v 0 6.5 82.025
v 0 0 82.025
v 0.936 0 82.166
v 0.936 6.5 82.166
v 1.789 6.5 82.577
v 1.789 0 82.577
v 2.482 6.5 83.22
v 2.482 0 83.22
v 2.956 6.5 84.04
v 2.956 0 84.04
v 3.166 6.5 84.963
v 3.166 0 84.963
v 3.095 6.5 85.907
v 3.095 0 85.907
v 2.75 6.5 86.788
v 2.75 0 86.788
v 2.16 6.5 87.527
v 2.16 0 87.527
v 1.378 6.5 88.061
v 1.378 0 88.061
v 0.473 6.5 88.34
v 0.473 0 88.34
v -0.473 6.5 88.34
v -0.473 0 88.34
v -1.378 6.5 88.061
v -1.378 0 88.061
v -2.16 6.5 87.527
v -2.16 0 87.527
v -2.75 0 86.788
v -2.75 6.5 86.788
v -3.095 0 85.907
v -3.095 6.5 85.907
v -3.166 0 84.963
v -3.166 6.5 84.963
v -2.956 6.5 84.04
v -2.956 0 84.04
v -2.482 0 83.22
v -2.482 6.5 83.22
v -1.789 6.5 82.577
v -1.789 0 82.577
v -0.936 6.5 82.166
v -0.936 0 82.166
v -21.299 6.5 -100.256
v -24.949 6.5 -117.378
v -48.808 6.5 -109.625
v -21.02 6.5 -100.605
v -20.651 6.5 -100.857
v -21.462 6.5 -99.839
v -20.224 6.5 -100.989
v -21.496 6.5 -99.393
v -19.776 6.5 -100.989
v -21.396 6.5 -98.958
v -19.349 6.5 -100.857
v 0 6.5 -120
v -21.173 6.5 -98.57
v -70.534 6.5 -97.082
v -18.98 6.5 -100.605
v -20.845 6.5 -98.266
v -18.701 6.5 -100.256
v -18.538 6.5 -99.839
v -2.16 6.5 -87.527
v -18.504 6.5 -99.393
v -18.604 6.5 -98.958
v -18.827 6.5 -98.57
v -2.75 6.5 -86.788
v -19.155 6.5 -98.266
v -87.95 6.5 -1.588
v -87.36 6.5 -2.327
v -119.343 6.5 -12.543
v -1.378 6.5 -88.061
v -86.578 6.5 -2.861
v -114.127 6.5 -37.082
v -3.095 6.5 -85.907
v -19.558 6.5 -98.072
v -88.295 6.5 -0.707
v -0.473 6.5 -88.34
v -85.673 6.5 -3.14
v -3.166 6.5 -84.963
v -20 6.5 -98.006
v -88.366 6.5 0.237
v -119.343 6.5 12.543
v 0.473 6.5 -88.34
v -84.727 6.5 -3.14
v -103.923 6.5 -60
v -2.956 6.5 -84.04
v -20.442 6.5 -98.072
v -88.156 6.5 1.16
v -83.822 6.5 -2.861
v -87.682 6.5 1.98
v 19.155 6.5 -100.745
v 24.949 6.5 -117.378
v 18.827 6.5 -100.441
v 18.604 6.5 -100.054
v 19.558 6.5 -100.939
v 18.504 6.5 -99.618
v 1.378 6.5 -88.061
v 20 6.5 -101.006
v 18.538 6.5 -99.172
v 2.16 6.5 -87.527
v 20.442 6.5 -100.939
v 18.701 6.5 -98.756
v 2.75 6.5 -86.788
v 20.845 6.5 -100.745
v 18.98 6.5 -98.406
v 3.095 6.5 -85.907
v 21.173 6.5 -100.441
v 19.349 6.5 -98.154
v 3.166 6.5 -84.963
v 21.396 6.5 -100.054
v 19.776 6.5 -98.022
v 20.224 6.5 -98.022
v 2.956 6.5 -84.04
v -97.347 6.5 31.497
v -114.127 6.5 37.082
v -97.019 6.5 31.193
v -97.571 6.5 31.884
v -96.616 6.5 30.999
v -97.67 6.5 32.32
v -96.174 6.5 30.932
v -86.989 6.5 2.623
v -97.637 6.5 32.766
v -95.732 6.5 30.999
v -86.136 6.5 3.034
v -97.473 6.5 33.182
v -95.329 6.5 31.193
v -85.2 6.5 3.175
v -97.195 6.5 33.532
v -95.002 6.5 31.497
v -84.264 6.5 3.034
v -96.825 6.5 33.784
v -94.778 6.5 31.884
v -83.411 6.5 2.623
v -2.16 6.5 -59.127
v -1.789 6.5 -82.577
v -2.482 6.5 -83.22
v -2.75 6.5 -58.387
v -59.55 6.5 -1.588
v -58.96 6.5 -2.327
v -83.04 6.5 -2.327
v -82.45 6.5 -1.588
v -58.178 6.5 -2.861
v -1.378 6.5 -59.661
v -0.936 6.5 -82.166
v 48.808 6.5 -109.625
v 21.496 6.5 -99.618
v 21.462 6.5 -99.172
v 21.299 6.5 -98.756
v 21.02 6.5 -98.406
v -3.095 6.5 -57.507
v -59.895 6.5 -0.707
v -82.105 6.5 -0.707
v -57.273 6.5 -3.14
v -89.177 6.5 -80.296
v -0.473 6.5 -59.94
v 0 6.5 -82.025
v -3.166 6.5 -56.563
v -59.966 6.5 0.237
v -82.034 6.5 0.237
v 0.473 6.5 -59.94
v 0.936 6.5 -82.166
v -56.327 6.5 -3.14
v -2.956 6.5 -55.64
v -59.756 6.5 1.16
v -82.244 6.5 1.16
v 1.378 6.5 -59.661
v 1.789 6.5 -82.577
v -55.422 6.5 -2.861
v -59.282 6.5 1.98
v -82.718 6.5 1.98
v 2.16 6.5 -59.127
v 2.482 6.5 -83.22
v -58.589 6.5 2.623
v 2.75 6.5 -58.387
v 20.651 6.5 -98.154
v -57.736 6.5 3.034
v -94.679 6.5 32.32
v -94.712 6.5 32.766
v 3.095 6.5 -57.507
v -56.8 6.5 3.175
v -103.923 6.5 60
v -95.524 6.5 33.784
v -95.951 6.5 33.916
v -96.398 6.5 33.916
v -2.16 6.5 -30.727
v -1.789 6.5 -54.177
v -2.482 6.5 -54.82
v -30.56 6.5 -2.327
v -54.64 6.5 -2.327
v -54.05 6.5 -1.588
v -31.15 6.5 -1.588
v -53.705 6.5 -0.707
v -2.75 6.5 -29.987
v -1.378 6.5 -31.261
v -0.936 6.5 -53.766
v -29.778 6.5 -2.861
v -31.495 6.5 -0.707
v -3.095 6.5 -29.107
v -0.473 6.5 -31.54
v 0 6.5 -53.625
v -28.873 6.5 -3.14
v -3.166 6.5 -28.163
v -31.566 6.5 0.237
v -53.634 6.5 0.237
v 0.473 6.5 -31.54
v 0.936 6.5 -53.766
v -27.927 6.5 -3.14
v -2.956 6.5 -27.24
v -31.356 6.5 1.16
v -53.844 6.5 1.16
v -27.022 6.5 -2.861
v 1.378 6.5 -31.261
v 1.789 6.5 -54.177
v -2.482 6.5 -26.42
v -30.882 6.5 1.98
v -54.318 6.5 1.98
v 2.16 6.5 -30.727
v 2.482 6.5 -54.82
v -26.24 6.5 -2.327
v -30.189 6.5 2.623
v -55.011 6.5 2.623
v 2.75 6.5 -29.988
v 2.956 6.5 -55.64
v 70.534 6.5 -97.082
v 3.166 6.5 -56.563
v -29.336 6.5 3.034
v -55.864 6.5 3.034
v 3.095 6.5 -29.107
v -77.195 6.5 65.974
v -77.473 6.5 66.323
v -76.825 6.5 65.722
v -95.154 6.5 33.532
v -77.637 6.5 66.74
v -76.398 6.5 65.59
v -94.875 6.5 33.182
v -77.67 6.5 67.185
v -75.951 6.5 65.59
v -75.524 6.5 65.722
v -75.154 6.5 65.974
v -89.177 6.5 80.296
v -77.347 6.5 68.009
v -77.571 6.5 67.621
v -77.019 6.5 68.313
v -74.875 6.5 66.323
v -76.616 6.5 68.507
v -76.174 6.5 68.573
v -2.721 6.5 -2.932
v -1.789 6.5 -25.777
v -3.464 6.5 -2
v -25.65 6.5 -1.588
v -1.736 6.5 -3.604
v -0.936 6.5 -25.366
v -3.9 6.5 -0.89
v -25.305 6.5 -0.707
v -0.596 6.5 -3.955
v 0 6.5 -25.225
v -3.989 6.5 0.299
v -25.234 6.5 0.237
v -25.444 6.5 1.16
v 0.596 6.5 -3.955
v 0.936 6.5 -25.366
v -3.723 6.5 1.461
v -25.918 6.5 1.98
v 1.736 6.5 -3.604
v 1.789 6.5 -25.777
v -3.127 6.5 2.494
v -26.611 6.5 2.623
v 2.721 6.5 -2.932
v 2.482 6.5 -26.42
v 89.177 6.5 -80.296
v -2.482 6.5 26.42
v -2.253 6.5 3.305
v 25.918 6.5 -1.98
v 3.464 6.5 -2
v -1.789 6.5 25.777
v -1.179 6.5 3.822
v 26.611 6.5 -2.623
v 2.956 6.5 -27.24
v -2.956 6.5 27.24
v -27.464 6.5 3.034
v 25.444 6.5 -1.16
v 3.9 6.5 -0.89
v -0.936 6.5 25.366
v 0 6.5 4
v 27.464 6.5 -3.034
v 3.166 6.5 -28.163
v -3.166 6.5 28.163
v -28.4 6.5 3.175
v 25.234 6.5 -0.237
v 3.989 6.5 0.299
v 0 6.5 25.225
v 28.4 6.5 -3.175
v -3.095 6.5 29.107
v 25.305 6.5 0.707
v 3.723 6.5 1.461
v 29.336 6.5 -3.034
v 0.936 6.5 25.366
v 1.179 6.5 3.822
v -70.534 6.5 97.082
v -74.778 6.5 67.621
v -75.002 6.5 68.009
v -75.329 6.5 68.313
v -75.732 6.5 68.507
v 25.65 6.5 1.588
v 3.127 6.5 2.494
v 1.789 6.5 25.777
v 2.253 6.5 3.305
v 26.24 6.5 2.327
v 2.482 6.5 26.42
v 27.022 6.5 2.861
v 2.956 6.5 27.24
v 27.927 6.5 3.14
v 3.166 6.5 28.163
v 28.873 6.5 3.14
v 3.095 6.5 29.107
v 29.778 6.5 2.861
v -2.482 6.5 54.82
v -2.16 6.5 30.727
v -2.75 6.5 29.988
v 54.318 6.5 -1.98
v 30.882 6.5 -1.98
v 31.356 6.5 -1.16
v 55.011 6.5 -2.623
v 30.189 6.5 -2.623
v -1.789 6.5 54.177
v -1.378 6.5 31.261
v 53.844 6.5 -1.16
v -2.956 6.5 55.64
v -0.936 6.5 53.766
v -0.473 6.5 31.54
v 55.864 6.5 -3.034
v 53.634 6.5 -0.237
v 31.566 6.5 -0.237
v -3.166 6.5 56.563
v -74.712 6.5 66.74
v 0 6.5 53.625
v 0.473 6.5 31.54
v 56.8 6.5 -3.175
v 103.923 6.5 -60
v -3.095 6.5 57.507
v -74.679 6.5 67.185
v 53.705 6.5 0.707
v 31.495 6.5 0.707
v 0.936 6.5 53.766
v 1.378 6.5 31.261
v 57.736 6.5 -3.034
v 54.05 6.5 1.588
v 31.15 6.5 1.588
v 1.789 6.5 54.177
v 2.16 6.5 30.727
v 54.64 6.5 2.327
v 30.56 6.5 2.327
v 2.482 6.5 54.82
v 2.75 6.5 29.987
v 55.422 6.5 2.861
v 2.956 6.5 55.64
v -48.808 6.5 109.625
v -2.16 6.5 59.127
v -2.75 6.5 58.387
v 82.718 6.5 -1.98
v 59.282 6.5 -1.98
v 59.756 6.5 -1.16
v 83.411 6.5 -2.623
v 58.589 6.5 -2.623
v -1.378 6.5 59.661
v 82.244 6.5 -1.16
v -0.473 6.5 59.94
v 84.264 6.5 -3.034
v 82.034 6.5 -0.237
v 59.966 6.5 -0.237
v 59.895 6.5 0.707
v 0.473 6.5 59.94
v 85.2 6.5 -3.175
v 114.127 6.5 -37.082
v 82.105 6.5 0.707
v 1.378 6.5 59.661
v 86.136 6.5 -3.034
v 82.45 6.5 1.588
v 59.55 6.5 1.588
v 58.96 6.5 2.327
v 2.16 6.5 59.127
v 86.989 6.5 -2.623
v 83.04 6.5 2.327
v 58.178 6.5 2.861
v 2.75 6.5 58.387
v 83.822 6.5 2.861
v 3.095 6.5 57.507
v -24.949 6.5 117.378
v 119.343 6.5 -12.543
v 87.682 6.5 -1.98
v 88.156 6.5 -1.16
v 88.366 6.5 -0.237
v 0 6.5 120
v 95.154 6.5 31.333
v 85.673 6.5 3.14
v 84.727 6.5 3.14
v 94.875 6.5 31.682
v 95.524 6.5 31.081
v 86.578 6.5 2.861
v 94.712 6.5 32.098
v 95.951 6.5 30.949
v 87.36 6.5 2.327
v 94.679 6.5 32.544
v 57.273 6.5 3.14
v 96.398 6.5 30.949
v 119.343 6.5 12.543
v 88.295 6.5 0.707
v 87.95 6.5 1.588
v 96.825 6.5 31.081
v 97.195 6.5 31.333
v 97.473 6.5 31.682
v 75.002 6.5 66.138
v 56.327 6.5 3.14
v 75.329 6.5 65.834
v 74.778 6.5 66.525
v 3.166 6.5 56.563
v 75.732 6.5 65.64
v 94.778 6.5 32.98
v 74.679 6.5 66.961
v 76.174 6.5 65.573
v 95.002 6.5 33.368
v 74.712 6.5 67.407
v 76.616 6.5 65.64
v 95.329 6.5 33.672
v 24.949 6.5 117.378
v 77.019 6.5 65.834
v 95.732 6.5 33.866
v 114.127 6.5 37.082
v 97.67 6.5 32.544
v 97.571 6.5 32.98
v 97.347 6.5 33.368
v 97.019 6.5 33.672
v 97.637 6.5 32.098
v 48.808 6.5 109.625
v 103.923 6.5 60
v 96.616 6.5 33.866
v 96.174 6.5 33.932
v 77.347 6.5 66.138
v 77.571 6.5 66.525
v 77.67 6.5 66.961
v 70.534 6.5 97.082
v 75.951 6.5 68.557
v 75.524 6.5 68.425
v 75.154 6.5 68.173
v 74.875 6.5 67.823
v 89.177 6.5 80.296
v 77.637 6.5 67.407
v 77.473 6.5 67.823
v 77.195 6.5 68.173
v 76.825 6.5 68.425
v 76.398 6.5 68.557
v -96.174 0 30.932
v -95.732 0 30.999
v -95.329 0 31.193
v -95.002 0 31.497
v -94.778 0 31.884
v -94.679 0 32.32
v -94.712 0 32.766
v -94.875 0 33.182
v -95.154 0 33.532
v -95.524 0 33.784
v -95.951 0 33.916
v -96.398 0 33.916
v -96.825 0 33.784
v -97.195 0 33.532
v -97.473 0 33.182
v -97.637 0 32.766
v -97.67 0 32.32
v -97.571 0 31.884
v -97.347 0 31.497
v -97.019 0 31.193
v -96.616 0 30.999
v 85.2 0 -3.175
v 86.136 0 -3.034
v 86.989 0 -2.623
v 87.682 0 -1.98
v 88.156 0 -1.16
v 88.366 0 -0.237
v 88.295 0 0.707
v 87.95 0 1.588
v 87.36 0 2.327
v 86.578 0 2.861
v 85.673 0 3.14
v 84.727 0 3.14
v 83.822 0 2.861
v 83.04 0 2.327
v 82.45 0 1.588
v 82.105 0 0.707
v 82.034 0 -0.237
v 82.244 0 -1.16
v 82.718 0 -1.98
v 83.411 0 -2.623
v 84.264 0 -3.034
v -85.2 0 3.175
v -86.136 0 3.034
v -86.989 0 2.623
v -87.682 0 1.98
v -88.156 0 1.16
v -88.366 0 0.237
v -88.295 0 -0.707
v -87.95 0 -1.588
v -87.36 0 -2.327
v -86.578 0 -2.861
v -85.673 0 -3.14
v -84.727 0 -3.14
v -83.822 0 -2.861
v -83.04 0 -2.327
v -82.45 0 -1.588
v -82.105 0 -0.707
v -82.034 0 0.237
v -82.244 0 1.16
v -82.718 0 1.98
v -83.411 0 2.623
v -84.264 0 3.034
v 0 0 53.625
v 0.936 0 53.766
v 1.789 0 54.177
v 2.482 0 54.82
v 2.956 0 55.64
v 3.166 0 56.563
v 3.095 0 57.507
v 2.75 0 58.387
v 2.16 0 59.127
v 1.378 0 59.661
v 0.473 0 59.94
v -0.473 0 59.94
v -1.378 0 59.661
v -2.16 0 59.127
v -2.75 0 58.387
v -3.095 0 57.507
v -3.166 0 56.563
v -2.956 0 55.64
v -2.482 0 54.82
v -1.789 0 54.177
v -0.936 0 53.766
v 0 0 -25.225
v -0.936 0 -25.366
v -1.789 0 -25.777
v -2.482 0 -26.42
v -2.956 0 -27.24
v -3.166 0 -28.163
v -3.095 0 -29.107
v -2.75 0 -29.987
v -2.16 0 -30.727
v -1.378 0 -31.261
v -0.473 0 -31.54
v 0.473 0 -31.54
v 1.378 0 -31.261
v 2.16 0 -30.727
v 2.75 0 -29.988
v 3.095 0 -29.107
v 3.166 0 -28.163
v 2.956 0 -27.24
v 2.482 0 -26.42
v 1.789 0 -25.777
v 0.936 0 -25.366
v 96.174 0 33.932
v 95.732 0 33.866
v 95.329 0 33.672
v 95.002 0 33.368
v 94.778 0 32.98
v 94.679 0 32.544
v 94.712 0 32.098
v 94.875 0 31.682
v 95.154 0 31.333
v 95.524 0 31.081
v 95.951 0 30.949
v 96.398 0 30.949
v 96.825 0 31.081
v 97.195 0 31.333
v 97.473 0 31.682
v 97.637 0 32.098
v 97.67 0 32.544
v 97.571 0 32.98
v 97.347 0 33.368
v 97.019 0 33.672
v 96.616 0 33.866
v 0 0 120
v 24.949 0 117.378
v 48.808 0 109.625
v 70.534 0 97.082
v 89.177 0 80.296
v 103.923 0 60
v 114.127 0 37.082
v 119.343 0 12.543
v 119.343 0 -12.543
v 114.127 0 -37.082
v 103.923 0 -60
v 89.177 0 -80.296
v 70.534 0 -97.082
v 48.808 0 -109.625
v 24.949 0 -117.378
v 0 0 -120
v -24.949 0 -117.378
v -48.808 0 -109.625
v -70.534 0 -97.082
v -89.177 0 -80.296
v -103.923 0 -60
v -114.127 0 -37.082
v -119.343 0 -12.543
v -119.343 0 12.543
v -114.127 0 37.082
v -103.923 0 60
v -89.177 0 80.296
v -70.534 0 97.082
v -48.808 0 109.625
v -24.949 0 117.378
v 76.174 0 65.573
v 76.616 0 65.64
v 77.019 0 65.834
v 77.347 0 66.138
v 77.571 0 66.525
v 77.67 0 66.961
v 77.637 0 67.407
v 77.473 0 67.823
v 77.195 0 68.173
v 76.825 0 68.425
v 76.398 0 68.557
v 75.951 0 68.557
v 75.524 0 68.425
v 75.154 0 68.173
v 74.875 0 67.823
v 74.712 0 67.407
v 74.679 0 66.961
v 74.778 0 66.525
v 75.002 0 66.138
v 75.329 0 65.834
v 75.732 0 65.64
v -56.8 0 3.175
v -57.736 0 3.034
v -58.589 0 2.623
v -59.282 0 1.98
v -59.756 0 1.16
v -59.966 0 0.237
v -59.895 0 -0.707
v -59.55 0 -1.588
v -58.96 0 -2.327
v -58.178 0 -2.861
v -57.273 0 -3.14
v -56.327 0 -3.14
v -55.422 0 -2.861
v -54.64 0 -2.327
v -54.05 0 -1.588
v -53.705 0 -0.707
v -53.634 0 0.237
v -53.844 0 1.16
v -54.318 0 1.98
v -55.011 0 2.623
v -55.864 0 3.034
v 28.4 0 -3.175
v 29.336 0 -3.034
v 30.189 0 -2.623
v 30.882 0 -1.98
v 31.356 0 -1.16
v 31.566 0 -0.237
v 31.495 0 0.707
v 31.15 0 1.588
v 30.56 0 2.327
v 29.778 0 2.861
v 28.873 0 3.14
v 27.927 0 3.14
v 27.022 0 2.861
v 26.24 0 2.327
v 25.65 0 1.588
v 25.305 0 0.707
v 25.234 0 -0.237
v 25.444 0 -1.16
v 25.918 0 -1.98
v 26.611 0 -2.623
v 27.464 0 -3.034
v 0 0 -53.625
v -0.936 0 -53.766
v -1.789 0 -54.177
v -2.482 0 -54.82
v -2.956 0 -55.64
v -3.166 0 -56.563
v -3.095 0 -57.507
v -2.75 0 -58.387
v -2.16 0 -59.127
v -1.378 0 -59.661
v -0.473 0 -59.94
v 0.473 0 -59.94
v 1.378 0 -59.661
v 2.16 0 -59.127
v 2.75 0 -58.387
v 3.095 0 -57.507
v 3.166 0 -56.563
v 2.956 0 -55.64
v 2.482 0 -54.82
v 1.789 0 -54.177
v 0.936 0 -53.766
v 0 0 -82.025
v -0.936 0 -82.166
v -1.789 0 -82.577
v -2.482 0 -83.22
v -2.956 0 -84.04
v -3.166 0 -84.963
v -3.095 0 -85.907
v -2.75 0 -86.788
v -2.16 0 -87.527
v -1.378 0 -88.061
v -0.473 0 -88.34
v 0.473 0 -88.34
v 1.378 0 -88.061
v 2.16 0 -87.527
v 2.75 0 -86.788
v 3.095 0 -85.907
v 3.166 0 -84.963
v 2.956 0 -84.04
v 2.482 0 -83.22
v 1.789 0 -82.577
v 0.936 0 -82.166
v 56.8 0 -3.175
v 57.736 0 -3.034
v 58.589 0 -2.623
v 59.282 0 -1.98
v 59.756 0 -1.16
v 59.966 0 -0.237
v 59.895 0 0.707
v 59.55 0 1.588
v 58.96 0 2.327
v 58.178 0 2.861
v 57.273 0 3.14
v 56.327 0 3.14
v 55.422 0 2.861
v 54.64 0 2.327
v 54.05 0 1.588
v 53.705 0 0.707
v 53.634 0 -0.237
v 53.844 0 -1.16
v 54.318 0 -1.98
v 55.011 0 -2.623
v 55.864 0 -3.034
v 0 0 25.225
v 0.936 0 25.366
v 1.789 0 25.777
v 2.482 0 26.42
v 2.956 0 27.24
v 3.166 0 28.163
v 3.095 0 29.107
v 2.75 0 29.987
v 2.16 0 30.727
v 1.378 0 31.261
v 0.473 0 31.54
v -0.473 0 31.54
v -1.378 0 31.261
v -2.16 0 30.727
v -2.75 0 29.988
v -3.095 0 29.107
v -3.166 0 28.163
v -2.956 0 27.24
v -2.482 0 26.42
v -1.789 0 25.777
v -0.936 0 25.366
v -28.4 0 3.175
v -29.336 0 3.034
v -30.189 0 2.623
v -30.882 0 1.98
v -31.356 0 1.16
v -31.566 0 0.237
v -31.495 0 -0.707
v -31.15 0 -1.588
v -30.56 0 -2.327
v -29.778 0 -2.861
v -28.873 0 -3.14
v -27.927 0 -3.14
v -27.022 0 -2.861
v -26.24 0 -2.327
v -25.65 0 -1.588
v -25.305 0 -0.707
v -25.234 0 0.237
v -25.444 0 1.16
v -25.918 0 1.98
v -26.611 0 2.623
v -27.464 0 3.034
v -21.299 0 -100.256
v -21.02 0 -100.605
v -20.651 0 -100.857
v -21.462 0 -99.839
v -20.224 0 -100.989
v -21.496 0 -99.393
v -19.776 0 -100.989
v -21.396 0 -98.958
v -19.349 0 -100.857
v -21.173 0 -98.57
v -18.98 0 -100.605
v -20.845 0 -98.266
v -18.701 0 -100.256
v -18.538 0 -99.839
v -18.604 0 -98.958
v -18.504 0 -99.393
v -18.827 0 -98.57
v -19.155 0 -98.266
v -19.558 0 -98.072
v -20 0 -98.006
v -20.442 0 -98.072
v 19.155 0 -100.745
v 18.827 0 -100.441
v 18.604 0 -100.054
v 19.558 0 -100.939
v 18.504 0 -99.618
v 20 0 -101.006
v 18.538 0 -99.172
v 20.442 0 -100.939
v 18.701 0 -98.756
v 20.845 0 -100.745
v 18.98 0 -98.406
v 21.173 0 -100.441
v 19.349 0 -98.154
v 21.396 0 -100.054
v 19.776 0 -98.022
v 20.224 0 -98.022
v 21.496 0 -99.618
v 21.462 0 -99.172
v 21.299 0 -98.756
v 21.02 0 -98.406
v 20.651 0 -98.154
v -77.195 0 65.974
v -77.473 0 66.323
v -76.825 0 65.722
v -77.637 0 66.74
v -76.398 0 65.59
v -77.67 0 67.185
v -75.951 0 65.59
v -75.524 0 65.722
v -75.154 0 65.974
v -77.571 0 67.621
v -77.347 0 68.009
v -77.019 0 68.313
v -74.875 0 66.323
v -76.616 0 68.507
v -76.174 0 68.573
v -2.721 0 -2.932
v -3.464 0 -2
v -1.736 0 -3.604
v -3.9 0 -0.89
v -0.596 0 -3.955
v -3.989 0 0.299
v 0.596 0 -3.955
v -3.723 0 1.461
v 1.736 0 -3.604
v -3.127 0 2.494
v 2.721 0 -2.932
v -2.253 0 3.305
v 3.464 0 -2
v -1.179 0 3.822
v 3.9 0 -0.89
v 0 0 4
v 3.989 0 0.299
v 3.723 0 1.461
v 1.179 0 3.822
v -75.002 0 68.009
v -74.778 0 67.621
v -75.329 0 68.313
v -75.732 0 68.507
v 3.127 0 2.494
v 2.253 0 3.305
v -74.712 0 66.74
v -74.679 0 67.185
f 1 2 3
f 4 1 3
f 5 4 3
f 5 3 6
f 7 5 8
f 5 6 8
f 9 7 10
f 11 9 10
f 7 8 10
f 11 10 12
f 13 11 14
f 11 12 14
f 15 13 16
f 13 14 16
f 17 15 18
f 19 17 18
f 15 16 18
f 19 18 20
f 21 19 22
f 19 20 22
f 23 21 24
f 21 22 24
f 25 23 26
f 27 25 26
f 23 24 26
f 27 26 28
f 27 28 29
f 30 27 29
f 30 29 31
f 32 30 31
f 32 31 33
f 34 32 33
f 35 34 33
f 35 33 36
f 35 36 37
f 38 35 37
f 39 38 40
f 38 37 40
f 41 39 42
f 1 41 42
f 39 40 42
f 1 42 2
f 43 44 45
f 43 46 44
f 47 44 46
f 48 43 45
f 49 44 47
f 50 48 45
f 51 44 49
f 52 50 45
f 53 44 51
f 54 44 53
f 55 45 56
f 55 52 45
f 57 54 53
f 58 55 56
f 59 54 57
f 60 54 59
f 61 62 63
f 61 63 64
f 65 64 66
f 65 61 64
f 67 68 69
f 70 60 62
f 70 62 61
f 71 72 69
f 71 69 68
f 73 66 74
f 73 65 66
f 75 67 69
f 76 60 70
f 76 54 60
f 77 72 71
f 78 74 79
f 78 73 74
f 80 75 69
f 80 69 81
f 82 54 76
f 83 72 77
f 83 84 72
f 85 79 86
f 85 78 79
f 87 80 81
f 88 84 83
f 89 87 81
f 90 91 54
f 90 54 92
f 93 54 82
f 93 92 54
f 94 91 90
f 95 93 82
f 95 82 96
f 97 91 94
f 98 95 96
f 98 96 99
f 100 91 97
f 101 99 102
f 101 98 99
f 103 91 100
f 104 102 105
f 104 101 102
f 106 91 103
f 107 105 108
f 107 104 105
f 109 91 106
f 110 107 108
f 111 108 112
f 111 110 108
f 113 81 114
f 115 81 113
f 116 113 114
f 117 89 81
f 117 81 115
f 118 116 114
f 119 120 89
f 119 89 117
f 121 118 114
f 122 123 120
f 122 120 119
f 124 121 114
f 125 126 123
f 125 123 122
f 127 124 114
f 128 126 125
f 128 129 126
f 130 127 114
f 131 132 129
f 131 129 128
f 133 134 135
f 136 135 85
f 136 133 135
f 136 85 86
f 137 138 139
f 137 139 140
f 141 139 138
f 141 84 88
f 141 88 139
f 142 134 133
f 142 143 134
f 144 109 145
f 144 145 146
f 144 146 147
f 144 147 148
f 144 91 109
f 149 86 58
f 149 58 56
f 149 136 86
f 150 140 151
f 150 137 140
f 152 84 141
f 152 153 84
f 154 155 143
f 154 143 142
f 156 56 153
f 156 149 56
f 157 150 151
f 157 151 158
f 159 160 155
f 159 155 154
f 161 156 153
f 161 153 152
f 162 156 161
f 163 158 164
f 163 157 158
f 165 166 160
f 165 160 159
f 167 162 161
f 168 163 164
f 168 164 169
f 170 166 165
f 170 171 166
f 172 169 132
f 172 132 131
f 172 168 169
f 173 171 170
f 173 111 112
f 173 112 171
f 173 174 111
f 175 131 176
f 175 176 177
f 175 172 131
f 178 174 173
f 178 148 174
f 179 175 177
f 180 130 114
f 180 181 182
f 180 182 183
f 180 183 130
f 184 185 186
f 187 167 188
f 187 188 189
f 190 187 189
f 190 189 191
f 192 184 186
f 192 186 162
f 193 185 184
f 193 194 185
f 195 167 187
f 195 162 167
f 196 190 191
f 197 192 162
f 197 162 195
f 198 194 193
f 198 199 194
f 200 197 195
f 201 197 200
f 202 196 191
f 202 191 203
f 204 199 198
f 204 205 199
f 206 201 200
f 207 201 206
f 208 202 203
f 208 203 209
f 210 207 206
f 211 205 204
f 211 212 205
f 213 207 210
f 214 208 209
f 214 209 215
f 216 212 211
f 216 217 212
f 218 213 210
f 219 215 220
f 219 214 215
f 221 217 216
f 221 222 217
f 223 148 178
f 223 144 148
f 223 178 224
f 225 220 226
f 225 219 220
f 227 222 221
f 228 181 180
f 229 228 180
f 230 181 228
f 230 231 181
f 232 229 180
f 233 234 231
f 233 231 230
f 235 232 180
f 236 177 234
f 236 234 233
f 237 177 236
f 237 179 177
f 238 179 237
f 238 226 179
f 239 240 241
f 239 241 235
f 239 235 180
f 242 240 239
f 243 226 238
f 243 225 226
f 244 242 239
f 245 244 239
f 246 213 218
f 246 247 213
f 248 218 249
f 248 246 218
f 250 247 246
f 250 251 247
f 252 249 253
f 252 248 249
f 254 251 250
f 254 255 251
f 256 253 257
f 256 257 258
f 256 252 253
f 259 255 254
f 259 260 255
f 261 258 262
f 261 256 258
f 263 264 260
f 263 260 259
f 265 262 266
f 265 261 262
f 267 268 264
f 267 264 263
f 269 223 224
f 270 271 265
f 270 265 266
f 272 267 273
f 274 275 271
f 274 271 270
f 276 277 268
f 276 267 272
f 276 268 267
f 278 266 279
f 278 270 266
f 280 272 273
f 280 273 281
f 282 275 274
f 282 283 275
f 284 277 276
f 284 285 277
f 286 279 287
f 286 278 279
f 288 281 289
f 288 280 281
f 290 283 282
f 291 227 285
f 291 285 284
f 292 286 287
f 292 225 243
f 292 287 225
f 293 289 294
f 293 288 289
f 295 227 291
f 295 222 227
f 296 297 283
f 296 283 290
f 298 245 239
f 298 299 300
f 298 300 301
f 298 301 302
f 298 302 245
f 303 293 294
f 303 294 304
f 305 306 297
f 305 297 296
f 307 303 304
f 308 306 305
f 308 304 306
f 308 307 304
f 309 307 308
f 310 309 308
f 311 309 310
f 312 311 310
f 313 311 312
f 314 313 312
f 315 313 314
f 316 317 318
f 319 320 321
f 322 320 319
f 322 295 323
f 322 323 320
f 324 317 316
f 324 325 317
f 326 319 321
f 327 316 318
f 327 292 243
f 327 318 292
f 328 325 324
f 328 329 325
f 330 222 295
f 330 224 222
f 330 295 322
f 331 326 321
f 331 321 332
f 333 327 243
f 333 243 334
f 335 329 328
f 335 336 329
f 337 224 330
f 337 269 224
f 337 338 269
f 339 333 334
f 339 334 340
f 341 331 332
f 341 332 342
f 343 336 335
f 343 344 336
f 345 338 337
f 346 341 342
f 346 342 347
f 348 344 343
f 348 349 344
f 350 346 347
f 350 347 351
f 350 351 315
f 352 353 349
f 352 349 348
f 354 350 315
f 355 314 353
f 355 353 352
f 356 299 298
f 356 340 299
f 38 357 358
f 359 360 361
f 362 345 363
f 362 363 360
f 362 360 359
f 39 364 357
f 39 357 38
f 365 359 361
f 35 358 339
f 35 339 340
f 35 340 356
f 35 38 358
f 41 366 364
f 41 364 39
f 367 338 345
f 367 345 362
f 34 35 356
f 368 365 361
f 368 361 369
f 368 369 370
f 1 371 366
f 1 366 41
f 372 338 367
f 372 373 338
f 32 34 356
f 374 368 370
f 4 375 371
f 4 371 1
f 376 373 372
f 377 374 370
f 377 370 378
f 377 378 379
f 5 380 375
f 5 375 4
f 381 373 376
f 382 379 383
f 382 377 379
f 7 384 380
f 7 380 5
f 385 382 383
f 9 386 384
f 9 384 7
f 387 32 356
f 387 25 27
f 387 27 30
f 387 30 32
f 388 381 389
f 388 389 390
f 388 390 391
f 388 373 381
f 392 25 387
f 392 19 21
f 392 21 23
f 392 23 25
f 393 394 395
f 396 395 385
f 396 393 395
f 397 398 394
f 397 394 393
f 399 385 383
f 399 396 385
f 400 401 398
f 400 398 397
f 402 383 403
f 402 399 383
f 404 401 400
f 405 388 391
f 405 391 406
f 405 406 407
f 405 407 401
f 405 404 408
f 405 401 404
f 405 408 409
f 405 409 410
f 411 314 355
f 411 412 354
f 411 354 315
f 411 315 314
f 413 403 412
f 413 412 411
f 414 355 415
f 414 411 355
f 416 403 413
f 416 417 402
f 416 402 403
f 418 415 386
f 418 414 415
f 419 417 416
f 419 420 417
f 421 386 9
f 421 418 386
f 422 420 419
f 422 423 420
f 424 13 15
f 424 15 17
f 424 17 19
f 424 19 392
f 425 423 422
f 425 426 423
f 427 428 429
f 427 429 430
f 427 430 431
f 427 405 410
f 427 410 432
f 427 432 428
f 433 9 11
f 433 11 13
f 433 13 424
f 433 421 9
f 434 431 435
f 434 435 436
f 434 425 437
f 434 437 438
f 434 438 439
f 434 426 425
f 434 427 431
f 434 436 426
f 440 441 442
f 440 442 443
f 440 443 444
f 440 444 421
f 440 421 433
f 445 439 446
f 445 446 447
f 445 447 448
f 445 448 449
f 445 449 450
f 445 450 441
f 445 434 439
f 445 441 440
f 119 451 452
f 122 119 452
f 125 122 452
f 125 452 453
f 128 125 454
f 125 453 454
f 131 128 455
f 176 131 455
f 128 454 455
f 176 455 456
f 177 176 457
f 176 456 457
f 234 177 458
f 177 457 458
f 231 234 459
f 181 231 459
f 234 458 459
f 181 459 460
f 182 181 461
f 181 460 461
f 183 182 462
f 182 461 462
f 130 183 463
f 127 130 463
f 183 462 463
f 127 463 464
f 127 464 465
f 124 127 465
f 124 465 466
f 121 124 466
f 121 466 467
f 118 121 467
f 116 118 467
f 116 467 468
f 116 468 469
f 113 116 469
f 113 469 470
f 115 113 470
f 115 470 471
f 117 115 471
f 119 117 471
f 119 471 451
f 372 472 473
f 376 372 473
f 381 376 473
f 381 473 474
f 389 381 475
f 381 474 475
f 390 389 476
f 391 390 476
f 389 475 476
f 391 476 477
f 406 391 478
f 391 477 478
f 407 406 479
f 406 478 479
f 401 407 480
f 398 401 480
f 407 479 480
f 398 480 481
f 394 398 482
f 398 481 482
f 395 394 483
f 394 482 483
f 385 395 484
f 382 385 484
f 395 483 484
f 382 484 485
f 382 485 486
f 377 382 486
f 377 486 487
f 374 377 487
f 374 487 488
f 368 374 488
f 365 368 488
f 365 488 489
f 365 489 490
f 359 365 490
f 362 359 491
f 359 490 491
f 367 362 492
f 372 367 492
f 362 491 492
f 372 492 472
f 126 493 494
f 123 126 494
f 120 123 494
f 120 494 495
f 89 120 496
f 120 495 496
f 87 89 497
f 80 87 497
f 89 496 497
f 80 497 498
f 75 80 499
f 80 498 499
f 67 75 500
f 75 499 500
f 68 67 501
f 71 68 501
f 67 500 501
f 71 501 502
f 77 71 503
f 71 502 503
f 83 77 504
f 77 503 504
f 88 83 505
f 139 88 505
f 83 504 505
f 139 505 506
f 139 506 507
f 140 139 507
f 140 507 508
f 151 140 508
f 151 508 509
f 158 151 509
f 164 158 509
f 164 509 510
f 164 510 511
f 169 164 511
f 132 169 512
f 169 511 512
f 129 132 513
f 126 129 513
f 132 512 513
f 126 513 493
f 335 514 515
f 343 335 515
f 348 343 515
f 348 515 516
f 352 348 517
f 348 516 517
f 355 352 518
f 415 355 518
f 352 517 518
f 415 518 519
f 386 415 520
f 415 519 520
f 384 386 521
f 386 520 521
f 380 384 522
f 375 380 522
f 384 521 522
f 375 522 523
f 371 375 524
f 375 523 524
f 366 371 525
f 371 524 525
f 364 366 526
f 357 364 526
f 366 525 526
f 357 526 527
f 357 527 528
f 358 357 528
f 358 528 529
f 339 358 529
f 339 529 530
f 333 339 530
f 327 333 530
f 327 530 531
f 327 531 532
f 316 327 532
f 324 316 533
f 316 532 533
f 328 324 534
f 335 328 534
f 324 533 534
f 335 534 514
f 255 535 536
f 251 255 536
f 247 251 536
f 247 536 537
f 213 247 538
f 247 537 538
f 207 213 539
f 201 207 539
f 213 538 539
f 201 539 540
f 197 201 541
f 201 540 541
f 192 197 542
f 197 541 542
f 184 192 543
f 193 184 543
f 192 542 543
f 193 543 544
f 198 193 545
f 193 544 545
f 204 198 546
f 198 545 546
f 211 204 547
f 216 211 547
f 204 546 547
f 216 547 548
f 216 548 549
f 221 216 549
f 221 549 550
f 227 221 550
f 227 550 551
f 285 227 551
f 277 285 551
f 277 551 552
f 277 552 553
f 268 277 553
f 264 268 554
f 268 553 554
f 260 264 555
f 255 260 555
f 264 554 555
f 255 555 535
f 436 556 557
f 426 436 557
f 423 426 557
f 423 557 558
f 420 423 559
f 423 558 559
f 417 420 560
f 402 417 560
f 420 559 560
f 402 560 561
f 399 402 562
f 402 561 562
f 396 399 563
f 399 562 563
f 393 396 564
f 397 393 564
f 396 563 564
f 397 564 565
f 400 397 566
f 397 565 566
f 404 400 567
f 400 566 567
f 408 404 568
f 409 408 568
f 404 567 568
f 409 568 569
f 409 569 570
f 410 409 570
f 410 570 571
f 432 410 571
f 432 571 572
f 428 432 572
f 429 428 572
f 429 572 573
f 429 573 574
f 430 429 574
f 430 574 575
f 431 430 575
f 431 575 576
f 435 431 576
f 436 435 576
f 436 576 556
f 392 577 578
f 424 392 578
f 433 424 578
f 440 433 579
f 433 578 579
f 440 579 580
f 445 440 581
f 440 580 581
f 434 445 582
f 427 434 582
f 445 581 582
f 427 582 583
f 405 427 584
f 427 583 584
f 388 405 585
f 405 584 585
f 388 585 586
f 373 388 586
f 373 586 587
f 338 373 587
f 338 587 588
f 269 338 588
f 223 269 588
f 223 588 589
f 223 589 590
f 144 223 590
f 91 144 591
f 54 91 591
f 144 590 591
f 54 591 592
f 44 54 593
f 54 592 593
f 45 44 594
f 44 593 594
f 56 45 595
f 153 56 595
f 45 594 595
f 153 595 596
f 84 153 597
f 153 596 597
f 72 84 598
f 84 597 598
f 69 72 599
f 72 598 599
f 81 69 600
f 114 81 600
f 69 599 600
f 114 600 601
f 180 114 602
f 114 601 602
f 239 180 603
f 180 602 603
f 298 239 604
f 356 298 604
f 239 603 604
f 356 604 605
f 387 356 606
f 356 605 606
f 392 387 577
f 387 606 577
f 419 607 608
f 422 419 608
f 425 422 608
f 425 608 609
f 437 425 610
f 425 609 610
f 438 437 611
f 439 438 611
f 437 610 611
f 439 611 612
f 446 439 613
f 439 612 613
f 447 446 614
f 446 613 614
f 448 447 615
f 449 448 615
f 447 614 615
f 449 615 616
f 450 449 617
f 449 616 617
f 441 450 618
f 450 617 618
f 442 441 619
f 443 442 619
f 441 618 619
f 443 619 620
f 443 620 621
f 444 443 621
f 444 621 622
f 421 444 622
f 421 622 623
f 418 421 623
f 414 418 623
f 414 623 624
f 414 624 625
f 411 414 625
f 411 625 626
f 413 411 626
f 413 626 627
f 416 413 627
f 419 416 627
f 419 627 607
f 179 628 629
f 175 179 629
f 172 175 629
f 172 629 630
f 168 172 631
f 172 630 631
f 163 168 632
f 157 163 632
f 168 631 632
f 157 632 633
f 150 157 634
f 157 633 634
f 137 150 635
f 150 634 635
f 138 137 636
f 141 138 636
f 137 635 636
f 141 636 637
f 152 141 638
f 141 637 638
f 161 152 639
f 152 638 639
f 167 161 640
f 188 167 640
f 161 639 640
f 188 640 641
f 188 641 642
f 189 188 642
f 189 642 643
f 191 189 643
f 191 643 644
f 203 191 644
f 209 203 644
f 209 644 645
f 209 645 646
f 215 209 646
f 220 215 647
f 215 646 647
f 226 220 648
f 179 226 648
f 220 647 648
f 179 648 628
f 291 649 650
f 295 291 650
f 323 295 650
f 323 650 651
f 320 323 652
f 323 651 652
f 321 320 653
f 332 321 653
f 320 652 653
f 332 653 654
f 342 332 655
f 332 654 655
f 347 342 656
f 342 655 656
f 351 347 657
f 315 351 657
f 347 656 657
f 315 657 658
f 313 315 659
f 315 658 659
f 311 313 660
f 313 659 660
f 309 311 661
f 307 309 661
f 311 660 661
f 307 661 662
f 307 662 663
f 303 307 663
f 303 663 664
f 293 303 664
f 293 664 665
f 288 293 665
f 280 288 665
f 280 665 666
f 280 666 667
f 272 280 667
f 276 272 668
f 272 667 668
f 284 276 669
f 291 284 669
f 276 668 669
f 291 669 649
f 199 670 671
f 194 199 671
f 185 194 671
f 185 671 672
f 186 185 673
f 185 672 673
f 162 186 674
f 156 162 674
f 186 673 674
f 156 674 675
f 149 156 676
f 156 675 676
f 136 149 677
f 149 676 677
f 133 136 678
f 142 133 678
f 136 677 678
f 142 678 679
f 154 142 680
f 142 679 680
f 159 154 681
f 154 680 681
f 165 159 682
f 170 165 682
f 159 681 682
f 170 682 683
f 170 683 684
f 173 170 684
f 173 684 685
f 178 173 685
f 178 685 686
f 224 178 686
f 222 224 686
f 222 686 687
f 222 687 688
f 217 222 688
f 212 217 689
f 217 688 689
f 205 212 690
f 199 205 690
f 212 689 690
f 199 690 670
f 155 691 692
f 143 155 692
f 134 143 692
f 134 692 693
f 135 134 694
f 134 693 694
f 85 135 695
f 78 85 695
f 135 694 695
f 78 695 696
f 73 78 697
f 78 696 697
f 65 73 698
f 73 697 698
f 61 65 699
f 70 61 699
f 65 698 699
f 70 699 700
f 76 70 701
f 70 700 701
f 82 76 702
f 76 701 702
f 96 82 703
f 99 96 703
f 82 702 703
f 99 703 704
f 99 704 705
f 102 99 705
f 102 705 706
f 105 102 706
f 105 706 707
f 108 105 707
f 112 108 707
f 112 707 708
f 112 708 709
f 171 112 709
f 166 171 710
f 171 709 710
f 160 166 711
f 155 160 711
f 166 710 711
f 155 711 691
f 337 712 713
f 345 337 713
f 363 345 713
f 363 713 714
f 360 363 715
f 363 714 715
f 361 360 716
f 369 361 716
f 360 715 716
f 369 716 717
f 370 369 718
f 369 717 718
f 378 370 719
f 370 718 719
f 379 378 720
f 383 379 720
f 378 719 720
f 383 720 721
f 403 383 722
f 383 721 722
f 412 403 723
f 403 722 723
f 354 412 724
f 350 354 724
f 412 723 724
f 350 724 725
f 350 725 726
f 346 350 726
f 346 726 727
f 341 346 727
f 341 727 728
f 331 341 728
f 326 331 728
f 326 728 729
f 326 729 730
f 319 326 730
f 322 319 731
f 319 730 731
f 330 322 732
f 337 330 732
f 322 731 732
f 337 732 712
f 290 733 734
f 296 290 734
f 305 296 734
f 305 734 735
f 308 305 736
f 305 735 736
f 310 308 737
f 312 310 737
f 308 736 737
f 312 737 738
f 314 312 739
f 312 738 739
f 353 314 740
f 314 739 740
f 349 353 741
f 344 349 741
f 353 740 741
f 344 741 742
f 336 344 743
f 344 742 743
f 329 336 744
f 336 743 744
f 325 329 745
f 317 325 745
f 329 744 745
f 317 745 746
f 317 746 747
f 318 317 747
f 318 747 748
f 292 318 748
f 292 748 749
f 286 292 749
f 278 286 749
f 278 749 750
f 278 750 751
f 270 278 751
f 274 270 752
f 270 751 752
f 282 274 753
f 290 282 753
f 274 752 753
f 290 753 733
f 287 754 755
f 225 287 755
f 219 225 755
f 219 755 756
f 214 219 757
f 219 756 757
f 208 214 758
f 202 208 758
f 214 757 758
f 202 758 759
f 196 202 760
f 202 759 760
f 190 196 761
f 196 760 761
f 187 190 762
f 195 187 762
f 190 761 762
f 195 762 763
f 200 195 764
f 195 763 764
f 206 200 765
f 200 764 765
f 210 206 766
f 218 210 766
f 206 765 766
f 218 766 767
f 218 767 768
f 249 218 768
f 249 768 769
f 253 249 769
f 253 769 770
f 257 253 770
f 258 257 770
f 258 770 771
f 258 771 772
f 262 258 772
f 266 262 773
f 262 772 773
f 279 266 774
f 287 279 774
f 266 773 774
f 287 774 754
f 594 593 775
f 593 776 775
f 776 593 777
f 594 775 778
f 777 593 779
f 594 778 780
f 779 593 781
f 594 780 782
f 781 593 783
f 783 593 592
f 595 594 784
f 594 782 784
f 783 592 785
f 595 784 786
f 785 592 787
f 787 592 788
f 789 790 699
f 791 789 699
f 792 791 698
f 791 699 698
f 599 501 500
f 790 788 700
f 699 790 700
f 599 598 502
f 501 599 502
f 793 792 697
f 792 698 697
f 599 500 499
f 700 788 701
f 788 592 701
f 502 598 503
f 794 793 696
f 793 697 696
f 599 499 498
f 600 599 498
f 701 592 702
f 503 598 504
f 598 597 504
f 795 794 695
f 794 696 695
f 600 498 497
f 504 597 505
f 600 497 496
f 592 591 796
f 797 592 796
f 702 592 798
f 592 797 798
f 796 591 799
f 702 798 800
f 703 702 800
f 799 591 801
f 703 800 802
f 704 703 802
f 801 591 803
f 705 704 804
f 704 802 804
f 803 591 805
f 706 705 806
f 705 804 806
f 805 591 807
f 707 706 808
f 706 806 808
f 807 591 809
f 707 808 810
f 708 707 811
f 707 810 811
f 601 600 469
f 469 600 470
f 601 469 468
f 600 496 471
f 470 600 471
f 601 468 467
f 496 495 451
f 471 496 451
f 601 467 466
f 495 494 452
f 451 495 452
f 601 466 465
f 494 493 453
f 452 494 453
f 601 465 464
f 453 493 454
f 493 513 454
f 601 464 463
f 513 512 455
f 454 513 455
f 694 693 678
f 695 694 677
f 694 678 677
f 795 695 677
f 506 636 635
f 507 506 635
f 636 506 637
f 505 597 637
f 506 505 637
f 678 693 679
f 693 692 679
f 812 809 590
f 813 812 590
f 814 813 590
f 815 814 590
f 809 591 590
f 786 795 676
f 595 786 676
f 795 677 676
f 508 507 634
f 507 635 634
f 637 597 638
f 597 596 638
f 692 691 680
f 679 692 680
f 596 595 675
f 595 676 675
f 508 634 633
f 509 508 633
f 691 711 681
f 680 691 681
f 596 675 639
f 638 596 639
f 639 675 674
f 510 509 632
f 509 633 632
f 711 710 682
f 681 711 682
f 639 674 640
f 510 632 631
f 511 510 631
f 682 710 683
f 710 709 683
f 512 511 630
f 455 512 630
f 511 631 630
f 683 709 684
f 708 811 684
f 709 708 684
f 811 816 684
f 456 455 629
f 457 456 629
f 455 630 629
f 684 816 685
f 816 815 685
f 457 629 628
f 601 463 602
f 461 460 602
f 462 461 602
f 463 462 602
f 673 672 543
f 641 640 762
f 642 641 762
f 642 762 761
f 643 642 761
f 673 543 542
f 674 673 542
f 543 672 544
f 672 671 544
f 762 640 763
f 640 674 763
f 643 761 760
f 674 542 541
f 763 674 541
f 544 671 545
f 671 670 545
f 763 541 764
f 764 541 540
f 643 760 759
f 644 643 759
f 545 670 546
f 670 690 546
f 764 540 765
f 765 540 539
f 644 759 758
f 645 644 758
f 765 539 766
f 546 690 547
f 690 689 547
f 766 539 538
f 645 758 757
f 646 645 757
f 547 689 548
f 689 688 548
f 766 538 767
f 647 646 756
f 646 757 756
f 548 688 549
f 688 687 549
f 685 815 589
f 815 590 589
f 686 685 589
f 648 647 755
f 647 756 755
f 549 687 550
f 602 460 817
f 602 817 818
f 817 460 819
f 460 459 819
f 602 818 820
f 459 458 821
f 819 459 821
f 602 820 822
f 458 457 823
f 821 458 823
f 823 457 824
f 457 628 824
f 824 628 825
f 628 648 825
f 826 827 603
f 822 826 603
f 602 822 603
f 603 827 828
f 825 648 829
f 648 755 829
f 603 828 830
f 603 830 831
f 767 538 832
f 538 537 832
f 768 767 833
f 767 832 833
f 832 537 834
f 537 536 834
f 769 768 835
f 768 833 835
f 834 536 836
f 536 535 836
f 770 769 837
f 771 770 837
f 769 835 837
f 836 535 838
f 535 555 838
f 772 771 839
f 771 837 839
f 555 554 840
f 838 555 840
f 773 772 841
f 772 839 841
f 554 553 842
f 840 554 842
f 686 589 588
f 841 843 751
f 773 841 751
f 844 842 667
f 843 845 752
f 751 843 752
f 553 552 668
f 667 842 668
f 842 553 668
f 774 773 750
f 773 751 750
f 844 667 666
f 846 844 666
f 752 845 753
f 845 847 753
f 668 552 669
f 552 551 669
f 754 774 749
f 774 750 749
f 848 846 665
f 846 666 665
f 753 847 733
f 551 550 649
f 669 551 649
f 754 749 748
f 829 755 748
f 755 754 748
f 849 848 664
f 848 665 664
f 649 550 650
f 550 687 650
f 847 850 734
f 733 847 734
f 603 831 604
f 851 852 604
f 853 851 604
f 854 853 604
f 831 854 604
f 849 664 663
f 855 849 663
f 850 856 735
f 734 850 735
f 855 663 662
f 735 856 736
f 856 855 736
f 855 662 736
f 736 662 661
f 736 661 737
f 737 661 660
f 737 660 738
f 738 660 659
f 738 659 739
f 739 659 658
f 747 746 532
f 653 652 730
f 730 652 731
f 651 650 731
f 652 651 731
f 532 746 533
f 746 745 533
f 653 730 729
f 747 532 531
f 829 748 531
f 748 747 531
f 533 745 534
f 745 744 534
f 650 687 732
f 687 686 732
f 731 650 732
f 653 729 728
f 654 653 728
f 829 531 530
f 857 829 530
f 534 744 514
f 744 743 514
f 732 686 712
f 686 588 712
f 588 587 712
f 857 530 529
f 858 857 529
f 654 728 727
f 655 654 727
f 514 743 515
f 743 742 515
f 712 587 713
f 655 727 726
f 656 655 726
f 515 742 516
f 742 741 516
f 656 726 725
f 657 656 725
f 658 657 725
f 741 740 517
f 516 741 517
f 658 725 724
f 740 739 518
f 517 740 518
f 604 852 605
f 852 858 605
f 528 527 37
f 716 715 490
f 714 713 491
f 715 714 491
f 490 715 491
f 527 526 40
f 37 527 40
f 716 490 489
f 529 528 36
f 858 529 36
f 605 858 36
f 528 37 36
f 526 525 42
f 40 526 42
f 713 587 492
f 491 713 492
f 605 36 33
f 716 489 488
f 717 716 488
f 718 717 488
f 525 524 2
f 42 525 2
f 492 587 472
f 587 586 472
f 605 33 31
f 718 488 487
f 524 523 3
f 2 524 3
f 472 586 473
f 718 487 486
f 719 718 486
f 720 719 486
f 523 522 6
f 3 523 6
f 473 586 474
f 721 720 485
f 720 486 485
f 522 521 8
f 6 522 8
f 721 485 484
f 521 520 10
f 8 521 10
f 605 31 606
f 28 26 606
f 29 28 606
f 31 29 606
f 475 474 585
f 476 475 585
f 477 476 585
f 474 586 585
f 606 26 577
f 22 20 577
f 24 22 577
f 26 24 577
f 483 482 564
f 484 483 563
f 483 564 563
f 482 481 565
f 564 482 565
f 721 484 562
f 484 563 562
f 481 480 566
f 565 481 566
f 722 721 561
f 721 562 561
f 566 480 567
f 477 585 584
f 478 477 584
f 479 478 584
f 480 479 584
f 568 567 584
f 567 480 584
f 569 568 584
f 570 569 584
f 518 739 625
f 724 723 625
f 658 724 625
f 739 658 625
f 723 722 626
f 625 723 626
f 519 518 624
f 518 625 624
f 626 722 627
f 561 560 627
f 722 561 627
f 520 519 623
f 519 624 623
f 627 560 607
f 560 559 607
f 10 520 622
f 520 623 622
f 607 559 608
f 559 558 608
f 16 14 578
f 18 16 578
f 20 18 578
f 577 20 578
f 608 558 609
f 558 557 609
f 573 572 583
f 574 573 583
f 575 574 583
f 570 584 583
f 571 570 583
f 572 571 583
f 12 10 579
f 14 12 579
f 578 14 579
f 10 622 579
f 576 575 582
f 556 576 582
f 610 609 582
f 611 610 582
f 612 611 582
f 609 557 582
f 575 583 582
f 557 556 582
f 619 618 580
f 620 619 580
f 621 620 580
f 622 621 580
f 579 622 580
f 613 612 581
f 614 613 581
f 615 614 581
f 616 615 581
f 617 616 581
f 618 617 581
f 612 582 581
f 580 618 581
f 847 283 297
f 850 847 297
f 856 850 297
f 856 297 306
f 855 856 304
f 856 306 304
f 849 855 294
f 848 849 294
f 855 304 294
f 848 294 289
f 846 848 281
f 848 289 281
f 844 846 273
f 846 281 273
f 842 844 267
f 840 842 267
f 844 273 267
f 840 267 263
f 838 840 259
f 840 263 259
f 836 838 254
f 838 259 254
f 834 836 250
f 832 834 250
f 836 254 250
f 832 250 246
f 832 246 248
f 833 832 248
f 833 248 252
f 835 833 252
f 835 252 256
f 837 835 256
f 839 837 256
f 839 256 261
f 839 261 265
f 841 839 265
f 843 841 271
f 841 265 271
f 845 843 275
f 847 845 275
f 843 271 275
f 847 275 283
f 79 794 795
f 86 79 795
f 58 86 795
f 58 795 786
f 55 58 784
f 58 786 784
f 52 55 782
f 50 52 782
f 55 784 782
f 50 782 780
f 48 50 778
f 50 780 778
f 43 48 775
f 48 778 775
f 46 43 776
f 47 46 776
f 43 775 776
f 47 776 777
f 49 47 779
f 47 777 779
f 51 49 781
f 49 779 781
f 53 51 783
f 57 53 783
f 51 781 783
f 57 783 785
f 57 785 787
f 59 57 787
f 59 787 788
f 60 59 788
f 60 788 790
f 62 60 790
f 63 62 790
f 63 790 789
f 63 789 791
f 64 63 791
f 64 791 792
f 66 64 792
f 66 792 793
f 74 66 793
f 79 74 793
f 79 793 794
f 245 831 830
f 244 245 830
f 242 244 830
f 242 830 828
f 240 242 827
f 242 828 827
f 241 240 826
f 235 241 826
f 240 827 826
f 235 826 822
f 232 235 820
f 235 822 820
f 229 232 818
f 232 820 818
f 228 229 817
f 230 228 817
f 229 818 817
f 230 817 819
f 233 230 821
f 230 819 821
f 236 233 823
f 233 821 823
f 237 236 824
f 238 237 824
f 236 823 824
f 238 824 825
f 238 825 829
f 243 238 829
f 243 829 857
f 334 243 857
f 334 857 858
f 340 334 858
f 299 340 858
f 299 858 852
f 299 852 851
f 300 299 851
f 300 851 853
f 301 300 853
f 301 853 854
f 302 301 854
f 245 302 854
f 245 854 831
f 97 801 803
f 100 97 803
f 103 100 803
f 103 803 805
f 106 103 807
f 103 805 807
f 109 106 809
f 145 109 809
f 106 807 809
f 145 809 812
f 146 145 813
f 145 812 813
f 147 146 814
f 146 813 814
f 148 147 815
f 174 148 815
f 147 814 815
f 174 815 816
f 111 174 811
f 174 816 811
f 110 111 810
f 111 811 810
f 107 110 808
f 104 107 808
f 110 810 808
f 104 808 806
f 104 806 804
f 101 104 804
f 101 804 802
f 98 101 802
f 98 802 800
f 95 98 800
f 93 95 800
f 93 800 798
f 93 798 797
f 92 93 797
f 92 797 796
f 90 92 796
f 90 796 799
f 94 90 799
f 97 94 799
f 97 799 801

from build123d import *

# Parameters (mm, degrees)
CROQUIS1_R              = 120
SALIENTE_EXTRUIR1_DEPTH = 6.5
CROQUIS2_R              = 4
CORTAR_EXTRUIR1_DEPTH   = 6.5
CROQUIS3_R              = 3.175
CORTAR_EXTRUIR2_DEPTH   = 6.5
CROQUIS4_R              = 1.5
CORTAR_EXTRUIR3_DEPTH   = 10


with BuildPart() as part:
    # Croquis1 → Saliente-Extruir1 (new body)
    with BuildSketch(Plane(origin=(0, 0, 0), x_dir=(1, 0, 0), z_dir=(0, 1, 0))):
        with Locations(Location((0, 0, 0), (0, 0, 270))):
            Circle(CROQUIS1_R)
    extrude(amount=SALIENTE_EXTRUIR1_DEPTH)

    # Croquis2 → Cortar-Extruir1 (cut)
    with BuildSketch(Plane(origin=(0, 6.5, 0), x_dir=(1, 0, 0), z_dir=(0, 1, 0))):
        with Locations(Location((0, 0, 0), (0, 0, 270))):
            Circle(CROQUIS2_R)
    extrude(amount=-CORTAR_EXTRUIR1_DEPTH, mode=Mode.SUBTRACT)

    # Croquis3 → Cortar-Extruir2 (cut)
    with BuildSketch(Plane(origin=(0, 0, 0), x_dir=(-1, 0, 0), z_dir=(0, -1, 0))):
        with Locations(Location((-28.4, 0, 0), (0, 0, 90))):
            Circle(CROQUIS3_R)
        with Locations(Location((-56.8, 0, 0), (0, 0, 90))):
            Circle(CROQUIS3_R)
        with Locations(Location((-85.2, 0, 0), (0, 0, 90))):
            Circle(CROQUIS3_R)
        with Locations(Location((85.2, 0, 0), (0, 0, 270))):
            Circle(CROQUIS3_R)
        with Locations(Location((56.8, 0, 0), (0, 0, 270))):
            Circle(CROQUIS3_R)
        with Locations(Location((28.4, 0, 0), (0, 0, 270))):
            Circle(CROQUIS3_R)
        with Locations(Location((0, -28.4, 0), (0, 0, 90))):
            Circle(CROQUIS3_R)
        with Locations(Location((0, -56.8, 0), (0, 0, 90))):
            Circle(CROQUIS3_R)
        with Locations(Location((0, -85.2, 0), (0, 0, 90))):
            Circle(CROQUIS3_R)
        with Locations(Location((0, 85.2, 0), (0, 0, 270))):
            Circle(CROQUIS3_R)
        with Locations(Location((0, 56.8, 0), (0, 0, 270))):
            Circle(CROQUIS3_R)
        with Locations(Location((0, 28.4, 0), (0, 0, 270))):
            Circle(CROQUIS3_R)
    extrude(amount=-CORTAR_EXTRUIR2_DEPTH, mode=Mode.SUBTRACT)

    # Croquis4 → Cortar-Extruir3 (cut)
    with BuildSketch(Plane.XZ):
        with Locations(Location((20, -99.505571576, 0), (0, 0, 270))):
            Circle(CROQUIS4_R)
        with Locations(Location((-20, -99.505571576, 0), (0, 0, 90))):
            Circle(CROQUIS4_R)
        with Locations(Location((-96.174352803, 32.432277712, 0), (0, 0, 270))):
            Circle(CROQUIS4_R)
        with Locations(Location((-76.174352803, 67.073293864, 0), (0, 0, 90))):
            Circle(CROQUIS4_R)
        with Locations(Location((76.174352803, 67.073293864, 0), (0, 0, 270))):
            Circle(CROQUIS4_R)
        with Locations(Location((96.174352803, 32.432277712, 0), (0, 0, 90))):
            Circle(CROQUIS4_R)
    extrude(amount=-CORTAR_EXTRUIR3_DEPTH, mode=Mode.SUBTRACT)


solid = part.part
